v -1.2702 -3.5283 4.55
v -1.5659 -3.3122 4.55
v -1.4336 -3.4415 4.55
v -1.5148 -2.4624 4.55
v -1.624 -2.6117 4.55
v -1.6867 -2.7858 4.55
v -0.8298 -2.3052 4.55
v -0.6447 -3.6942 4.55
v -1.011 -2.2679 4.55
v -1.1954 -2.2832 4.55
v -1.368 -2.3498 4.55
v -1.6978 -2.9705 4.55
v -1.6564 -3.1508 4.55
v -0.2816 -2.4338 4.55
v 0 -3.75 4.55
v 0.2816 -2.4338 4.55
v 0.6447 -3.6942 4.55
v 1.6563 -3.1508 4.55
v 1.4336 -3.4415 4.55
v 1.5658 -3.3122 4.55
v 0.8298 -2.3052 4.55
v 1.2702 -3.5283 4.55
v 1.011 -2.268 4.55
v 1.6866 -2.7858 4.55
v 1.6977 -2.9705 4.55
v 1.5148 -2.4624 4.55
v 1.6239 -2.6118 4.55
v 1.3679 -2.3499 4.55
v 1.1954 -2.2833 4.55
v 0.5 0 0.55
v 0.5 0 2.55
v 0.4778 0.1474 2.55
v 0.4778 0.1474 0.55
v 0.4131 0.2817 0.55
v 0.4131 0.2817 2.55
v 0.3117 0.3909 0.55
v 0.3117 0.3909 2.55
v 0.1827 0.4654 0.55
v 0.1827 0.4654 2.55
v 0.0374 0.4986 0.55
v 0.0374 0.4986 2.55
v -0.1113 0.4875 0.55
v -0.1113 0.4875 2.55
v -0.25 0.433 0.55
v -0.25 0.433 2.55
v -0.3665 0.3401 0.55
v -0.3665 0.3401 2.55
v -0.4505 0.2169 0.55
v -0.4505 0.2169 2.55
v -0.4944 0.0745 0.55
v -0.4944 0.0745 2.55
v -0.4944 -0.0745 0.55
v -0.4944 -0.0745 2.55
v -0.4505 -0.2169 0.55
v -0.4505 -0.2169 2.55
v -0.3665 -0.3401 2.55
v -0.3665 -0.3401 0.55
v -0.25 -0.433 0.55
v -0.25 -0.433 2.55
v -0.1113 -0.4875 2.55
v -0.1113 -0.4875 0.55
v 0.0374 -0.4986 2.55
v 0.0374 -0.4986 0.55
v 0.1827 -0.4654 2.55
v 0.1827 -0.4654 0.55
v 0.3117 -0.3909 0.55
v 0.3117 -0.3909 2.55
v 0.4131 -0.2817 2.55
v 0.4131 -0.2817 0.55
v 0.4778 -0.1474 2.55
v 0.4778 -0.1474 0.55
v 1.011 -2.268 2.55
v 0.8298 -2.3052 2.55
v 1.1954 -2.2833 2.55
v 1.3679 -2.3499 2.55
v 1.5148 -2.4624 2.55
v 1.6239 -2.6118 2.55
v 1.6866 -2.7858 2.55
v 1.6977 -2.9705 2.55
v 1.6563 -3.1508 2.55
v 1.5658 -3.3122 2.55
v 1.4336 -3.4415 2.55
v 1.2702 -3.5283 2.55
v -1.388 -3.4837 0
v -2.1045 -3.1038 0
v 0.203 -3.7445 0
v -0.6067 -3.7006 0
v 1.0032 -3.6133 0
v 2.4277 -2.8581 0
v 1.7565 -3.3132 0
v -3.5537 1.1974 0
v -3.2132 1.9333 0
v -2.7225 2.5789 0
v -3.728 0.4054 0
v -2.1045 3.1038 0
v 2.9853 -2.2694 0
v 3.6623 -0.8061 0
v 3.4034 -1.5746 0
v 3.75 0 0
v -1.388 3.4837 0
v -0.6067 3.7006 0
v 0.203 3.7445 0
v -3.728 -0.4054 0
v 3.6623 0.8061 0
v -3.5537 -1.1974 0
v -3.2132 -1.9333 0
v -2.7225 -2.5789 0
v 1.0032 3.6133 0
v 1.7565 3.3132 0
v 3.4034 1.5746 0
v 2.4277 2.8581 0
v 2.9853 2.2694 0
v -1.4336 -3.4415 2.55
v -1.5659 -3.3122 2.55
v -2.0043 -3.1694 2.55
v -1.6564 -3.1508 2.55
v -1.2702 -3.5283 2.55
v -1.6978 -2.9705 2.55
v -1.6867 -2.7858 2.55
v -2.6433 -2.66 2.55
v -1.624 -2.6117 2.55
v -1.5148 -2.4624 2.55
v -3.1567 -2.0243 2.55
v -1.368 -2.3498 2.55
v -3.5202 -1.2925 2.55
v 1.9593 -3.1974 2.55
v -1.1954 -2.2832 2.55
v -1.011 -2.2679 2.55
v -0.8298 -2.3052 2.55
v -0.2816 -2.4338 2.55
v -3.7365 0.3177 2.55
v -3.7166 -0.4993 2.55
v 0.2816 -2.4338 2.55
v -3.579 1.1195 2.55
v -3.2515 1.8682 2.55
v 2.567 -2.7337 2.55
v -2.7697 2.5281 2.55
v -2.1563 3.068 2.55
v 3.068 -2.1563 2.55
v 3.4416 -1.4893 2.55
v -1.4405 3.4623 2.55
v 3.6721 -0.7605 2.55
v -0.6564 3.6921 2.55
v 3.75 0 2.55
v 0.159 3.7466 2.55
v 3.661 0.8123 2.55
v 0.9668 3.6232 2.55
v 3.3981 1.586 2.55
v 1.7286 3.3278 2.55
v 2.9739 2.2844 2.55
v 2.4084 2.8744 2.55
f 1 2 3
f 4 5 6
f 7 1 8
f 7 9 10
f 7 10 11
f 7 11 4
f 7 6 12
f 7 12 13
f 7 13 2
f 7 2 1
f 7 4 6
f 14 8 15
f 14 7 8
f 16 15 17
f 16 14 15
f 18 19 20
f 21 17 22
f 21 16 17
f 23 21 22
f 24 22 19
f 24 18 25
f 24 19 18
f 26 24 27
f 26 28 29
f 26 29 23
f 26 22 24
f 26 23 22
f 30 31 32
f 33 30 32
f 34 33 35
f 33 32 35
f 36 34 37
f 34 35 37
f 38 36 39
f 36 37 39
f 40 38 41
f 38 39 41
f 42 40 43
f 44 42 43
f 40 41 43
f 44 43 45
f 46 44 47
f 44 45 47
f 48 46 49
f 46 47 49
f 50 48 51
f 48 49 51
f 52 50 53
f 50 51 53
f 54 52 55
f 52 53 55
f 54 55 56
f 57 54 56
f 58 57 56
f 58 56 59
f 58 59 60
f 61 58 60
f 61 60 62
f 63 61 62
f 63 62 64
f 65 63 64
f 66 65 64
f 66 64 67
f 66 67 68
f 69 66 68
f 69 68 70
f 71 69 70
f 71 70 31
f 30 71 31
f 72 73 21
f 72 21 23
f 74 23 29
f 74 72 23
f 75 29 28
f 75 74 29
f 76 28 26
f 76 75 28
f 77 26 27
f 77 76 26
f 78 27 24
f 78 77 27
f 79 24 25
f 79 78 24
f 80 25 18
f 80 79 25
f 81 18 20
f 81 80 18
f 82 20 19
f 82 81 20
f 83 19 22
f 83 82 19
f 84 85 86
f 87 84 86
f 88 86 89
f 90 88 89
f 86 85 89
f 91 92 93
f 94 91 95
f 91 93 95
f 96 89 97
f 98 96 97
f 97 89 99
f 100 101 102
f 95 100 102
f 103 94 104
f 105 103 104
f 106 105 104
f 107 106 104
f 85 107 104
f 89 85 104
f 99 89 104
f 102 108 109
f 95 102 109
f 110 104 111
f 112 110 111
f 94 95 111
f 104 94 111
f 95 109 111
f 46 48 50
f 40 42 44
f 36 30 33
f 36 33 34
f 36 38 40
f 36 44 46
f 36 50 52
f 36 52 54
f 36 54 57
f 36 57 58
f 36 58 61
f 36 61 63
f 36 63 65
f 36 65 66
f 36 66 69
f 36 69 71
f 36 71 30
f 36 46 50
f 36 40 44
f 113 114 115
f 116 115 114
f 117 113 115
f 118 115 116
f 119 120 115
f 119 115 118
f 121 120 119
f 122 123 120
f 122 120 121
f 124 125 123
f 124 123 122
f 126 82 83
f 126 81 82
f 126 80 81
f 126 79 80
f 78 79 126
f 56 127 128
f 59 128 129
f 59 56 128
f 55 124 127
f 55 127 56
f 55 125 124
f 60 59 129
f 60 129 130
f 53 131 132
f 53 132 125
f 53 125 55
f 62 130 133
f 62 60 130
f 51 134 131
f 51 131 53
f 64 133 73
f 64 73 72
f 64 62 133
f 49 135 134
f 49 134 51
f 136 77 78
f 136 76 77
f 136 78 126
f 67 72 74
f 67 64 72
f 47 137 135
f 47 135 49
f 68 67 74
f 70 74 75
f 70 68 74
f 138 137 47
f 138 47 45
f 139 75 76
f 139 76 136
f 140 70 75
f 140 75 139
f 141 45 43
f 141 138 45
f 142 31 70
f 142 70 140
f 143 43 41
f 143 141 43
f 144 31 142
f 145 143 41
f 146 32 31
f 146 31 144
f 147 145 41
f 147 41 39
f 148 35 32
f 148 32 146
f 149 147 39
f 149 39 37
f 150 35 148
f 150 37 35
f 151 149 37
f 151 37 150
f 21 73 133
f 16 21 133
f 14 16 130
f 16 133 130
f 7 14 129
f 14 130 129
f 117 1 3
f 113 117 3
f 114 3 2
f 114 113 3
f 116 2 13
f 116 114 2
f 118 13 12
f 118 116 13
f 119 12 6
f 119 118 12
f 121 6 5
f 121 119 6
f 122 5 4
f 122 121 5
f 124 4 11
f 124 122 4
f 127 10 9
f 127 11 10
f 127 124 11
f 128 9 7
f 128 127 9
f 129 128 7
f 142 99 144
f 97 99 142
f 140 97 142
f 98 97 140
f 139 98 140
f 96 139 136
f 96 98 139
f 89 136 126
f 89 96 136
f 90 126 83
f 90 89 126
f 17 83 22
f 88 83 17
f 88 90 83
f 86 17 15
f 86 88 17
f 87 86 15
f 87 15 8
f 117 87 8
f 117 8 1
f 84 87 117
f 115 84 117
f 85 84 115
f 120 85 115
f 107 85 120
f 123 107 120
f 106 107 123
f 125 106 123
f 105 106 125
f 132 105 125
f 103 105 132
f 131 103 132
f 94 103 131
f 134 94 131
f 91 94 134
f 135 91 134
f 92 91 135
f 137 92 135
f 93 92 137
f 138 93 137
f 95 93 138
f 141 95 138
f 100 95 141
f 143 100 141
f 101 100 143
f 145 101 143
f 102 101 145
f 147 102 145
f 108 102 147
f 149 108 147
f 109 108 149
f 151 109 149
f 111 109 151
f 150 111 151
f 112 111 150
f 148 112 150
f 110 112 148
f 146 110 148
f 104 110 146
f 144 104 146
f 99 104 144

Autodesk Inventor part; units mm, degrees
ref_plane "YZ Plane" through (0, 0, 0) normal (1, 0, 0) x (0, 1, 0)
ref_plane "XZ Plane" through (0, 0, 0) normal (0, 1, 0) x (-1, 0, 0)
ref_plane "XY Plane" through (0, 0, 0) normal (0, 0, 1) x (1, 0, 0)
sketch "Sketch1" plane through (0, 0, 0) normal (0, 0, 1) x (1, 0, 0)
  circle A0 centre (0, 0) radius 3.9 projected
  circle A1 centre (0, 0) radius 3.75
  dimension "d0" = 7.5
extrude "Extrusion1" add sketch "Sketch1" along normal blind 2.55 contours A1
sketch "Sketch2" plane through (0, 0, 2.55) normal (0, 0, 1) x (1, 0, 0)
  arc A0 (-0.8298, -2.3052) -> (0.8298, -2.3052) centre (0, 0) ccw
  circle A1 centre (0, 0) radius 3.75 projected
  circle A2 centre (0, 0) radius 3.75 projected
  arc A3 (1.2702, -3.5283) -> (0.8298, -2.3052) centre (1.05, -2.9168) ccw
  arc A4 (-0.8298, -2.3052) -> (-1.2702, -3.5283) centre (-1.05, -2.9168) ccw
  line L0 (0, -2.45) -> (0, 0)
  dimension "d3" = 1.3
  dimension "d4" = 3.4
extrude "Extrusion2" add sketch "Sketch2" along normal blind 2 contours A0 A3 A1 A4 picked at (0, -3.3001)
sketch "Sketch3" plane through (0, 0, 2.55) normal (0, 0, 1) x (1, 0, 0)
  circle A0 centre (0, 0) radius 0.5
  dimension "d7" = 1
extrude "Extrusion3" cut sketch "Sketch3" against normal blind 2
properties part number "j024 output"
